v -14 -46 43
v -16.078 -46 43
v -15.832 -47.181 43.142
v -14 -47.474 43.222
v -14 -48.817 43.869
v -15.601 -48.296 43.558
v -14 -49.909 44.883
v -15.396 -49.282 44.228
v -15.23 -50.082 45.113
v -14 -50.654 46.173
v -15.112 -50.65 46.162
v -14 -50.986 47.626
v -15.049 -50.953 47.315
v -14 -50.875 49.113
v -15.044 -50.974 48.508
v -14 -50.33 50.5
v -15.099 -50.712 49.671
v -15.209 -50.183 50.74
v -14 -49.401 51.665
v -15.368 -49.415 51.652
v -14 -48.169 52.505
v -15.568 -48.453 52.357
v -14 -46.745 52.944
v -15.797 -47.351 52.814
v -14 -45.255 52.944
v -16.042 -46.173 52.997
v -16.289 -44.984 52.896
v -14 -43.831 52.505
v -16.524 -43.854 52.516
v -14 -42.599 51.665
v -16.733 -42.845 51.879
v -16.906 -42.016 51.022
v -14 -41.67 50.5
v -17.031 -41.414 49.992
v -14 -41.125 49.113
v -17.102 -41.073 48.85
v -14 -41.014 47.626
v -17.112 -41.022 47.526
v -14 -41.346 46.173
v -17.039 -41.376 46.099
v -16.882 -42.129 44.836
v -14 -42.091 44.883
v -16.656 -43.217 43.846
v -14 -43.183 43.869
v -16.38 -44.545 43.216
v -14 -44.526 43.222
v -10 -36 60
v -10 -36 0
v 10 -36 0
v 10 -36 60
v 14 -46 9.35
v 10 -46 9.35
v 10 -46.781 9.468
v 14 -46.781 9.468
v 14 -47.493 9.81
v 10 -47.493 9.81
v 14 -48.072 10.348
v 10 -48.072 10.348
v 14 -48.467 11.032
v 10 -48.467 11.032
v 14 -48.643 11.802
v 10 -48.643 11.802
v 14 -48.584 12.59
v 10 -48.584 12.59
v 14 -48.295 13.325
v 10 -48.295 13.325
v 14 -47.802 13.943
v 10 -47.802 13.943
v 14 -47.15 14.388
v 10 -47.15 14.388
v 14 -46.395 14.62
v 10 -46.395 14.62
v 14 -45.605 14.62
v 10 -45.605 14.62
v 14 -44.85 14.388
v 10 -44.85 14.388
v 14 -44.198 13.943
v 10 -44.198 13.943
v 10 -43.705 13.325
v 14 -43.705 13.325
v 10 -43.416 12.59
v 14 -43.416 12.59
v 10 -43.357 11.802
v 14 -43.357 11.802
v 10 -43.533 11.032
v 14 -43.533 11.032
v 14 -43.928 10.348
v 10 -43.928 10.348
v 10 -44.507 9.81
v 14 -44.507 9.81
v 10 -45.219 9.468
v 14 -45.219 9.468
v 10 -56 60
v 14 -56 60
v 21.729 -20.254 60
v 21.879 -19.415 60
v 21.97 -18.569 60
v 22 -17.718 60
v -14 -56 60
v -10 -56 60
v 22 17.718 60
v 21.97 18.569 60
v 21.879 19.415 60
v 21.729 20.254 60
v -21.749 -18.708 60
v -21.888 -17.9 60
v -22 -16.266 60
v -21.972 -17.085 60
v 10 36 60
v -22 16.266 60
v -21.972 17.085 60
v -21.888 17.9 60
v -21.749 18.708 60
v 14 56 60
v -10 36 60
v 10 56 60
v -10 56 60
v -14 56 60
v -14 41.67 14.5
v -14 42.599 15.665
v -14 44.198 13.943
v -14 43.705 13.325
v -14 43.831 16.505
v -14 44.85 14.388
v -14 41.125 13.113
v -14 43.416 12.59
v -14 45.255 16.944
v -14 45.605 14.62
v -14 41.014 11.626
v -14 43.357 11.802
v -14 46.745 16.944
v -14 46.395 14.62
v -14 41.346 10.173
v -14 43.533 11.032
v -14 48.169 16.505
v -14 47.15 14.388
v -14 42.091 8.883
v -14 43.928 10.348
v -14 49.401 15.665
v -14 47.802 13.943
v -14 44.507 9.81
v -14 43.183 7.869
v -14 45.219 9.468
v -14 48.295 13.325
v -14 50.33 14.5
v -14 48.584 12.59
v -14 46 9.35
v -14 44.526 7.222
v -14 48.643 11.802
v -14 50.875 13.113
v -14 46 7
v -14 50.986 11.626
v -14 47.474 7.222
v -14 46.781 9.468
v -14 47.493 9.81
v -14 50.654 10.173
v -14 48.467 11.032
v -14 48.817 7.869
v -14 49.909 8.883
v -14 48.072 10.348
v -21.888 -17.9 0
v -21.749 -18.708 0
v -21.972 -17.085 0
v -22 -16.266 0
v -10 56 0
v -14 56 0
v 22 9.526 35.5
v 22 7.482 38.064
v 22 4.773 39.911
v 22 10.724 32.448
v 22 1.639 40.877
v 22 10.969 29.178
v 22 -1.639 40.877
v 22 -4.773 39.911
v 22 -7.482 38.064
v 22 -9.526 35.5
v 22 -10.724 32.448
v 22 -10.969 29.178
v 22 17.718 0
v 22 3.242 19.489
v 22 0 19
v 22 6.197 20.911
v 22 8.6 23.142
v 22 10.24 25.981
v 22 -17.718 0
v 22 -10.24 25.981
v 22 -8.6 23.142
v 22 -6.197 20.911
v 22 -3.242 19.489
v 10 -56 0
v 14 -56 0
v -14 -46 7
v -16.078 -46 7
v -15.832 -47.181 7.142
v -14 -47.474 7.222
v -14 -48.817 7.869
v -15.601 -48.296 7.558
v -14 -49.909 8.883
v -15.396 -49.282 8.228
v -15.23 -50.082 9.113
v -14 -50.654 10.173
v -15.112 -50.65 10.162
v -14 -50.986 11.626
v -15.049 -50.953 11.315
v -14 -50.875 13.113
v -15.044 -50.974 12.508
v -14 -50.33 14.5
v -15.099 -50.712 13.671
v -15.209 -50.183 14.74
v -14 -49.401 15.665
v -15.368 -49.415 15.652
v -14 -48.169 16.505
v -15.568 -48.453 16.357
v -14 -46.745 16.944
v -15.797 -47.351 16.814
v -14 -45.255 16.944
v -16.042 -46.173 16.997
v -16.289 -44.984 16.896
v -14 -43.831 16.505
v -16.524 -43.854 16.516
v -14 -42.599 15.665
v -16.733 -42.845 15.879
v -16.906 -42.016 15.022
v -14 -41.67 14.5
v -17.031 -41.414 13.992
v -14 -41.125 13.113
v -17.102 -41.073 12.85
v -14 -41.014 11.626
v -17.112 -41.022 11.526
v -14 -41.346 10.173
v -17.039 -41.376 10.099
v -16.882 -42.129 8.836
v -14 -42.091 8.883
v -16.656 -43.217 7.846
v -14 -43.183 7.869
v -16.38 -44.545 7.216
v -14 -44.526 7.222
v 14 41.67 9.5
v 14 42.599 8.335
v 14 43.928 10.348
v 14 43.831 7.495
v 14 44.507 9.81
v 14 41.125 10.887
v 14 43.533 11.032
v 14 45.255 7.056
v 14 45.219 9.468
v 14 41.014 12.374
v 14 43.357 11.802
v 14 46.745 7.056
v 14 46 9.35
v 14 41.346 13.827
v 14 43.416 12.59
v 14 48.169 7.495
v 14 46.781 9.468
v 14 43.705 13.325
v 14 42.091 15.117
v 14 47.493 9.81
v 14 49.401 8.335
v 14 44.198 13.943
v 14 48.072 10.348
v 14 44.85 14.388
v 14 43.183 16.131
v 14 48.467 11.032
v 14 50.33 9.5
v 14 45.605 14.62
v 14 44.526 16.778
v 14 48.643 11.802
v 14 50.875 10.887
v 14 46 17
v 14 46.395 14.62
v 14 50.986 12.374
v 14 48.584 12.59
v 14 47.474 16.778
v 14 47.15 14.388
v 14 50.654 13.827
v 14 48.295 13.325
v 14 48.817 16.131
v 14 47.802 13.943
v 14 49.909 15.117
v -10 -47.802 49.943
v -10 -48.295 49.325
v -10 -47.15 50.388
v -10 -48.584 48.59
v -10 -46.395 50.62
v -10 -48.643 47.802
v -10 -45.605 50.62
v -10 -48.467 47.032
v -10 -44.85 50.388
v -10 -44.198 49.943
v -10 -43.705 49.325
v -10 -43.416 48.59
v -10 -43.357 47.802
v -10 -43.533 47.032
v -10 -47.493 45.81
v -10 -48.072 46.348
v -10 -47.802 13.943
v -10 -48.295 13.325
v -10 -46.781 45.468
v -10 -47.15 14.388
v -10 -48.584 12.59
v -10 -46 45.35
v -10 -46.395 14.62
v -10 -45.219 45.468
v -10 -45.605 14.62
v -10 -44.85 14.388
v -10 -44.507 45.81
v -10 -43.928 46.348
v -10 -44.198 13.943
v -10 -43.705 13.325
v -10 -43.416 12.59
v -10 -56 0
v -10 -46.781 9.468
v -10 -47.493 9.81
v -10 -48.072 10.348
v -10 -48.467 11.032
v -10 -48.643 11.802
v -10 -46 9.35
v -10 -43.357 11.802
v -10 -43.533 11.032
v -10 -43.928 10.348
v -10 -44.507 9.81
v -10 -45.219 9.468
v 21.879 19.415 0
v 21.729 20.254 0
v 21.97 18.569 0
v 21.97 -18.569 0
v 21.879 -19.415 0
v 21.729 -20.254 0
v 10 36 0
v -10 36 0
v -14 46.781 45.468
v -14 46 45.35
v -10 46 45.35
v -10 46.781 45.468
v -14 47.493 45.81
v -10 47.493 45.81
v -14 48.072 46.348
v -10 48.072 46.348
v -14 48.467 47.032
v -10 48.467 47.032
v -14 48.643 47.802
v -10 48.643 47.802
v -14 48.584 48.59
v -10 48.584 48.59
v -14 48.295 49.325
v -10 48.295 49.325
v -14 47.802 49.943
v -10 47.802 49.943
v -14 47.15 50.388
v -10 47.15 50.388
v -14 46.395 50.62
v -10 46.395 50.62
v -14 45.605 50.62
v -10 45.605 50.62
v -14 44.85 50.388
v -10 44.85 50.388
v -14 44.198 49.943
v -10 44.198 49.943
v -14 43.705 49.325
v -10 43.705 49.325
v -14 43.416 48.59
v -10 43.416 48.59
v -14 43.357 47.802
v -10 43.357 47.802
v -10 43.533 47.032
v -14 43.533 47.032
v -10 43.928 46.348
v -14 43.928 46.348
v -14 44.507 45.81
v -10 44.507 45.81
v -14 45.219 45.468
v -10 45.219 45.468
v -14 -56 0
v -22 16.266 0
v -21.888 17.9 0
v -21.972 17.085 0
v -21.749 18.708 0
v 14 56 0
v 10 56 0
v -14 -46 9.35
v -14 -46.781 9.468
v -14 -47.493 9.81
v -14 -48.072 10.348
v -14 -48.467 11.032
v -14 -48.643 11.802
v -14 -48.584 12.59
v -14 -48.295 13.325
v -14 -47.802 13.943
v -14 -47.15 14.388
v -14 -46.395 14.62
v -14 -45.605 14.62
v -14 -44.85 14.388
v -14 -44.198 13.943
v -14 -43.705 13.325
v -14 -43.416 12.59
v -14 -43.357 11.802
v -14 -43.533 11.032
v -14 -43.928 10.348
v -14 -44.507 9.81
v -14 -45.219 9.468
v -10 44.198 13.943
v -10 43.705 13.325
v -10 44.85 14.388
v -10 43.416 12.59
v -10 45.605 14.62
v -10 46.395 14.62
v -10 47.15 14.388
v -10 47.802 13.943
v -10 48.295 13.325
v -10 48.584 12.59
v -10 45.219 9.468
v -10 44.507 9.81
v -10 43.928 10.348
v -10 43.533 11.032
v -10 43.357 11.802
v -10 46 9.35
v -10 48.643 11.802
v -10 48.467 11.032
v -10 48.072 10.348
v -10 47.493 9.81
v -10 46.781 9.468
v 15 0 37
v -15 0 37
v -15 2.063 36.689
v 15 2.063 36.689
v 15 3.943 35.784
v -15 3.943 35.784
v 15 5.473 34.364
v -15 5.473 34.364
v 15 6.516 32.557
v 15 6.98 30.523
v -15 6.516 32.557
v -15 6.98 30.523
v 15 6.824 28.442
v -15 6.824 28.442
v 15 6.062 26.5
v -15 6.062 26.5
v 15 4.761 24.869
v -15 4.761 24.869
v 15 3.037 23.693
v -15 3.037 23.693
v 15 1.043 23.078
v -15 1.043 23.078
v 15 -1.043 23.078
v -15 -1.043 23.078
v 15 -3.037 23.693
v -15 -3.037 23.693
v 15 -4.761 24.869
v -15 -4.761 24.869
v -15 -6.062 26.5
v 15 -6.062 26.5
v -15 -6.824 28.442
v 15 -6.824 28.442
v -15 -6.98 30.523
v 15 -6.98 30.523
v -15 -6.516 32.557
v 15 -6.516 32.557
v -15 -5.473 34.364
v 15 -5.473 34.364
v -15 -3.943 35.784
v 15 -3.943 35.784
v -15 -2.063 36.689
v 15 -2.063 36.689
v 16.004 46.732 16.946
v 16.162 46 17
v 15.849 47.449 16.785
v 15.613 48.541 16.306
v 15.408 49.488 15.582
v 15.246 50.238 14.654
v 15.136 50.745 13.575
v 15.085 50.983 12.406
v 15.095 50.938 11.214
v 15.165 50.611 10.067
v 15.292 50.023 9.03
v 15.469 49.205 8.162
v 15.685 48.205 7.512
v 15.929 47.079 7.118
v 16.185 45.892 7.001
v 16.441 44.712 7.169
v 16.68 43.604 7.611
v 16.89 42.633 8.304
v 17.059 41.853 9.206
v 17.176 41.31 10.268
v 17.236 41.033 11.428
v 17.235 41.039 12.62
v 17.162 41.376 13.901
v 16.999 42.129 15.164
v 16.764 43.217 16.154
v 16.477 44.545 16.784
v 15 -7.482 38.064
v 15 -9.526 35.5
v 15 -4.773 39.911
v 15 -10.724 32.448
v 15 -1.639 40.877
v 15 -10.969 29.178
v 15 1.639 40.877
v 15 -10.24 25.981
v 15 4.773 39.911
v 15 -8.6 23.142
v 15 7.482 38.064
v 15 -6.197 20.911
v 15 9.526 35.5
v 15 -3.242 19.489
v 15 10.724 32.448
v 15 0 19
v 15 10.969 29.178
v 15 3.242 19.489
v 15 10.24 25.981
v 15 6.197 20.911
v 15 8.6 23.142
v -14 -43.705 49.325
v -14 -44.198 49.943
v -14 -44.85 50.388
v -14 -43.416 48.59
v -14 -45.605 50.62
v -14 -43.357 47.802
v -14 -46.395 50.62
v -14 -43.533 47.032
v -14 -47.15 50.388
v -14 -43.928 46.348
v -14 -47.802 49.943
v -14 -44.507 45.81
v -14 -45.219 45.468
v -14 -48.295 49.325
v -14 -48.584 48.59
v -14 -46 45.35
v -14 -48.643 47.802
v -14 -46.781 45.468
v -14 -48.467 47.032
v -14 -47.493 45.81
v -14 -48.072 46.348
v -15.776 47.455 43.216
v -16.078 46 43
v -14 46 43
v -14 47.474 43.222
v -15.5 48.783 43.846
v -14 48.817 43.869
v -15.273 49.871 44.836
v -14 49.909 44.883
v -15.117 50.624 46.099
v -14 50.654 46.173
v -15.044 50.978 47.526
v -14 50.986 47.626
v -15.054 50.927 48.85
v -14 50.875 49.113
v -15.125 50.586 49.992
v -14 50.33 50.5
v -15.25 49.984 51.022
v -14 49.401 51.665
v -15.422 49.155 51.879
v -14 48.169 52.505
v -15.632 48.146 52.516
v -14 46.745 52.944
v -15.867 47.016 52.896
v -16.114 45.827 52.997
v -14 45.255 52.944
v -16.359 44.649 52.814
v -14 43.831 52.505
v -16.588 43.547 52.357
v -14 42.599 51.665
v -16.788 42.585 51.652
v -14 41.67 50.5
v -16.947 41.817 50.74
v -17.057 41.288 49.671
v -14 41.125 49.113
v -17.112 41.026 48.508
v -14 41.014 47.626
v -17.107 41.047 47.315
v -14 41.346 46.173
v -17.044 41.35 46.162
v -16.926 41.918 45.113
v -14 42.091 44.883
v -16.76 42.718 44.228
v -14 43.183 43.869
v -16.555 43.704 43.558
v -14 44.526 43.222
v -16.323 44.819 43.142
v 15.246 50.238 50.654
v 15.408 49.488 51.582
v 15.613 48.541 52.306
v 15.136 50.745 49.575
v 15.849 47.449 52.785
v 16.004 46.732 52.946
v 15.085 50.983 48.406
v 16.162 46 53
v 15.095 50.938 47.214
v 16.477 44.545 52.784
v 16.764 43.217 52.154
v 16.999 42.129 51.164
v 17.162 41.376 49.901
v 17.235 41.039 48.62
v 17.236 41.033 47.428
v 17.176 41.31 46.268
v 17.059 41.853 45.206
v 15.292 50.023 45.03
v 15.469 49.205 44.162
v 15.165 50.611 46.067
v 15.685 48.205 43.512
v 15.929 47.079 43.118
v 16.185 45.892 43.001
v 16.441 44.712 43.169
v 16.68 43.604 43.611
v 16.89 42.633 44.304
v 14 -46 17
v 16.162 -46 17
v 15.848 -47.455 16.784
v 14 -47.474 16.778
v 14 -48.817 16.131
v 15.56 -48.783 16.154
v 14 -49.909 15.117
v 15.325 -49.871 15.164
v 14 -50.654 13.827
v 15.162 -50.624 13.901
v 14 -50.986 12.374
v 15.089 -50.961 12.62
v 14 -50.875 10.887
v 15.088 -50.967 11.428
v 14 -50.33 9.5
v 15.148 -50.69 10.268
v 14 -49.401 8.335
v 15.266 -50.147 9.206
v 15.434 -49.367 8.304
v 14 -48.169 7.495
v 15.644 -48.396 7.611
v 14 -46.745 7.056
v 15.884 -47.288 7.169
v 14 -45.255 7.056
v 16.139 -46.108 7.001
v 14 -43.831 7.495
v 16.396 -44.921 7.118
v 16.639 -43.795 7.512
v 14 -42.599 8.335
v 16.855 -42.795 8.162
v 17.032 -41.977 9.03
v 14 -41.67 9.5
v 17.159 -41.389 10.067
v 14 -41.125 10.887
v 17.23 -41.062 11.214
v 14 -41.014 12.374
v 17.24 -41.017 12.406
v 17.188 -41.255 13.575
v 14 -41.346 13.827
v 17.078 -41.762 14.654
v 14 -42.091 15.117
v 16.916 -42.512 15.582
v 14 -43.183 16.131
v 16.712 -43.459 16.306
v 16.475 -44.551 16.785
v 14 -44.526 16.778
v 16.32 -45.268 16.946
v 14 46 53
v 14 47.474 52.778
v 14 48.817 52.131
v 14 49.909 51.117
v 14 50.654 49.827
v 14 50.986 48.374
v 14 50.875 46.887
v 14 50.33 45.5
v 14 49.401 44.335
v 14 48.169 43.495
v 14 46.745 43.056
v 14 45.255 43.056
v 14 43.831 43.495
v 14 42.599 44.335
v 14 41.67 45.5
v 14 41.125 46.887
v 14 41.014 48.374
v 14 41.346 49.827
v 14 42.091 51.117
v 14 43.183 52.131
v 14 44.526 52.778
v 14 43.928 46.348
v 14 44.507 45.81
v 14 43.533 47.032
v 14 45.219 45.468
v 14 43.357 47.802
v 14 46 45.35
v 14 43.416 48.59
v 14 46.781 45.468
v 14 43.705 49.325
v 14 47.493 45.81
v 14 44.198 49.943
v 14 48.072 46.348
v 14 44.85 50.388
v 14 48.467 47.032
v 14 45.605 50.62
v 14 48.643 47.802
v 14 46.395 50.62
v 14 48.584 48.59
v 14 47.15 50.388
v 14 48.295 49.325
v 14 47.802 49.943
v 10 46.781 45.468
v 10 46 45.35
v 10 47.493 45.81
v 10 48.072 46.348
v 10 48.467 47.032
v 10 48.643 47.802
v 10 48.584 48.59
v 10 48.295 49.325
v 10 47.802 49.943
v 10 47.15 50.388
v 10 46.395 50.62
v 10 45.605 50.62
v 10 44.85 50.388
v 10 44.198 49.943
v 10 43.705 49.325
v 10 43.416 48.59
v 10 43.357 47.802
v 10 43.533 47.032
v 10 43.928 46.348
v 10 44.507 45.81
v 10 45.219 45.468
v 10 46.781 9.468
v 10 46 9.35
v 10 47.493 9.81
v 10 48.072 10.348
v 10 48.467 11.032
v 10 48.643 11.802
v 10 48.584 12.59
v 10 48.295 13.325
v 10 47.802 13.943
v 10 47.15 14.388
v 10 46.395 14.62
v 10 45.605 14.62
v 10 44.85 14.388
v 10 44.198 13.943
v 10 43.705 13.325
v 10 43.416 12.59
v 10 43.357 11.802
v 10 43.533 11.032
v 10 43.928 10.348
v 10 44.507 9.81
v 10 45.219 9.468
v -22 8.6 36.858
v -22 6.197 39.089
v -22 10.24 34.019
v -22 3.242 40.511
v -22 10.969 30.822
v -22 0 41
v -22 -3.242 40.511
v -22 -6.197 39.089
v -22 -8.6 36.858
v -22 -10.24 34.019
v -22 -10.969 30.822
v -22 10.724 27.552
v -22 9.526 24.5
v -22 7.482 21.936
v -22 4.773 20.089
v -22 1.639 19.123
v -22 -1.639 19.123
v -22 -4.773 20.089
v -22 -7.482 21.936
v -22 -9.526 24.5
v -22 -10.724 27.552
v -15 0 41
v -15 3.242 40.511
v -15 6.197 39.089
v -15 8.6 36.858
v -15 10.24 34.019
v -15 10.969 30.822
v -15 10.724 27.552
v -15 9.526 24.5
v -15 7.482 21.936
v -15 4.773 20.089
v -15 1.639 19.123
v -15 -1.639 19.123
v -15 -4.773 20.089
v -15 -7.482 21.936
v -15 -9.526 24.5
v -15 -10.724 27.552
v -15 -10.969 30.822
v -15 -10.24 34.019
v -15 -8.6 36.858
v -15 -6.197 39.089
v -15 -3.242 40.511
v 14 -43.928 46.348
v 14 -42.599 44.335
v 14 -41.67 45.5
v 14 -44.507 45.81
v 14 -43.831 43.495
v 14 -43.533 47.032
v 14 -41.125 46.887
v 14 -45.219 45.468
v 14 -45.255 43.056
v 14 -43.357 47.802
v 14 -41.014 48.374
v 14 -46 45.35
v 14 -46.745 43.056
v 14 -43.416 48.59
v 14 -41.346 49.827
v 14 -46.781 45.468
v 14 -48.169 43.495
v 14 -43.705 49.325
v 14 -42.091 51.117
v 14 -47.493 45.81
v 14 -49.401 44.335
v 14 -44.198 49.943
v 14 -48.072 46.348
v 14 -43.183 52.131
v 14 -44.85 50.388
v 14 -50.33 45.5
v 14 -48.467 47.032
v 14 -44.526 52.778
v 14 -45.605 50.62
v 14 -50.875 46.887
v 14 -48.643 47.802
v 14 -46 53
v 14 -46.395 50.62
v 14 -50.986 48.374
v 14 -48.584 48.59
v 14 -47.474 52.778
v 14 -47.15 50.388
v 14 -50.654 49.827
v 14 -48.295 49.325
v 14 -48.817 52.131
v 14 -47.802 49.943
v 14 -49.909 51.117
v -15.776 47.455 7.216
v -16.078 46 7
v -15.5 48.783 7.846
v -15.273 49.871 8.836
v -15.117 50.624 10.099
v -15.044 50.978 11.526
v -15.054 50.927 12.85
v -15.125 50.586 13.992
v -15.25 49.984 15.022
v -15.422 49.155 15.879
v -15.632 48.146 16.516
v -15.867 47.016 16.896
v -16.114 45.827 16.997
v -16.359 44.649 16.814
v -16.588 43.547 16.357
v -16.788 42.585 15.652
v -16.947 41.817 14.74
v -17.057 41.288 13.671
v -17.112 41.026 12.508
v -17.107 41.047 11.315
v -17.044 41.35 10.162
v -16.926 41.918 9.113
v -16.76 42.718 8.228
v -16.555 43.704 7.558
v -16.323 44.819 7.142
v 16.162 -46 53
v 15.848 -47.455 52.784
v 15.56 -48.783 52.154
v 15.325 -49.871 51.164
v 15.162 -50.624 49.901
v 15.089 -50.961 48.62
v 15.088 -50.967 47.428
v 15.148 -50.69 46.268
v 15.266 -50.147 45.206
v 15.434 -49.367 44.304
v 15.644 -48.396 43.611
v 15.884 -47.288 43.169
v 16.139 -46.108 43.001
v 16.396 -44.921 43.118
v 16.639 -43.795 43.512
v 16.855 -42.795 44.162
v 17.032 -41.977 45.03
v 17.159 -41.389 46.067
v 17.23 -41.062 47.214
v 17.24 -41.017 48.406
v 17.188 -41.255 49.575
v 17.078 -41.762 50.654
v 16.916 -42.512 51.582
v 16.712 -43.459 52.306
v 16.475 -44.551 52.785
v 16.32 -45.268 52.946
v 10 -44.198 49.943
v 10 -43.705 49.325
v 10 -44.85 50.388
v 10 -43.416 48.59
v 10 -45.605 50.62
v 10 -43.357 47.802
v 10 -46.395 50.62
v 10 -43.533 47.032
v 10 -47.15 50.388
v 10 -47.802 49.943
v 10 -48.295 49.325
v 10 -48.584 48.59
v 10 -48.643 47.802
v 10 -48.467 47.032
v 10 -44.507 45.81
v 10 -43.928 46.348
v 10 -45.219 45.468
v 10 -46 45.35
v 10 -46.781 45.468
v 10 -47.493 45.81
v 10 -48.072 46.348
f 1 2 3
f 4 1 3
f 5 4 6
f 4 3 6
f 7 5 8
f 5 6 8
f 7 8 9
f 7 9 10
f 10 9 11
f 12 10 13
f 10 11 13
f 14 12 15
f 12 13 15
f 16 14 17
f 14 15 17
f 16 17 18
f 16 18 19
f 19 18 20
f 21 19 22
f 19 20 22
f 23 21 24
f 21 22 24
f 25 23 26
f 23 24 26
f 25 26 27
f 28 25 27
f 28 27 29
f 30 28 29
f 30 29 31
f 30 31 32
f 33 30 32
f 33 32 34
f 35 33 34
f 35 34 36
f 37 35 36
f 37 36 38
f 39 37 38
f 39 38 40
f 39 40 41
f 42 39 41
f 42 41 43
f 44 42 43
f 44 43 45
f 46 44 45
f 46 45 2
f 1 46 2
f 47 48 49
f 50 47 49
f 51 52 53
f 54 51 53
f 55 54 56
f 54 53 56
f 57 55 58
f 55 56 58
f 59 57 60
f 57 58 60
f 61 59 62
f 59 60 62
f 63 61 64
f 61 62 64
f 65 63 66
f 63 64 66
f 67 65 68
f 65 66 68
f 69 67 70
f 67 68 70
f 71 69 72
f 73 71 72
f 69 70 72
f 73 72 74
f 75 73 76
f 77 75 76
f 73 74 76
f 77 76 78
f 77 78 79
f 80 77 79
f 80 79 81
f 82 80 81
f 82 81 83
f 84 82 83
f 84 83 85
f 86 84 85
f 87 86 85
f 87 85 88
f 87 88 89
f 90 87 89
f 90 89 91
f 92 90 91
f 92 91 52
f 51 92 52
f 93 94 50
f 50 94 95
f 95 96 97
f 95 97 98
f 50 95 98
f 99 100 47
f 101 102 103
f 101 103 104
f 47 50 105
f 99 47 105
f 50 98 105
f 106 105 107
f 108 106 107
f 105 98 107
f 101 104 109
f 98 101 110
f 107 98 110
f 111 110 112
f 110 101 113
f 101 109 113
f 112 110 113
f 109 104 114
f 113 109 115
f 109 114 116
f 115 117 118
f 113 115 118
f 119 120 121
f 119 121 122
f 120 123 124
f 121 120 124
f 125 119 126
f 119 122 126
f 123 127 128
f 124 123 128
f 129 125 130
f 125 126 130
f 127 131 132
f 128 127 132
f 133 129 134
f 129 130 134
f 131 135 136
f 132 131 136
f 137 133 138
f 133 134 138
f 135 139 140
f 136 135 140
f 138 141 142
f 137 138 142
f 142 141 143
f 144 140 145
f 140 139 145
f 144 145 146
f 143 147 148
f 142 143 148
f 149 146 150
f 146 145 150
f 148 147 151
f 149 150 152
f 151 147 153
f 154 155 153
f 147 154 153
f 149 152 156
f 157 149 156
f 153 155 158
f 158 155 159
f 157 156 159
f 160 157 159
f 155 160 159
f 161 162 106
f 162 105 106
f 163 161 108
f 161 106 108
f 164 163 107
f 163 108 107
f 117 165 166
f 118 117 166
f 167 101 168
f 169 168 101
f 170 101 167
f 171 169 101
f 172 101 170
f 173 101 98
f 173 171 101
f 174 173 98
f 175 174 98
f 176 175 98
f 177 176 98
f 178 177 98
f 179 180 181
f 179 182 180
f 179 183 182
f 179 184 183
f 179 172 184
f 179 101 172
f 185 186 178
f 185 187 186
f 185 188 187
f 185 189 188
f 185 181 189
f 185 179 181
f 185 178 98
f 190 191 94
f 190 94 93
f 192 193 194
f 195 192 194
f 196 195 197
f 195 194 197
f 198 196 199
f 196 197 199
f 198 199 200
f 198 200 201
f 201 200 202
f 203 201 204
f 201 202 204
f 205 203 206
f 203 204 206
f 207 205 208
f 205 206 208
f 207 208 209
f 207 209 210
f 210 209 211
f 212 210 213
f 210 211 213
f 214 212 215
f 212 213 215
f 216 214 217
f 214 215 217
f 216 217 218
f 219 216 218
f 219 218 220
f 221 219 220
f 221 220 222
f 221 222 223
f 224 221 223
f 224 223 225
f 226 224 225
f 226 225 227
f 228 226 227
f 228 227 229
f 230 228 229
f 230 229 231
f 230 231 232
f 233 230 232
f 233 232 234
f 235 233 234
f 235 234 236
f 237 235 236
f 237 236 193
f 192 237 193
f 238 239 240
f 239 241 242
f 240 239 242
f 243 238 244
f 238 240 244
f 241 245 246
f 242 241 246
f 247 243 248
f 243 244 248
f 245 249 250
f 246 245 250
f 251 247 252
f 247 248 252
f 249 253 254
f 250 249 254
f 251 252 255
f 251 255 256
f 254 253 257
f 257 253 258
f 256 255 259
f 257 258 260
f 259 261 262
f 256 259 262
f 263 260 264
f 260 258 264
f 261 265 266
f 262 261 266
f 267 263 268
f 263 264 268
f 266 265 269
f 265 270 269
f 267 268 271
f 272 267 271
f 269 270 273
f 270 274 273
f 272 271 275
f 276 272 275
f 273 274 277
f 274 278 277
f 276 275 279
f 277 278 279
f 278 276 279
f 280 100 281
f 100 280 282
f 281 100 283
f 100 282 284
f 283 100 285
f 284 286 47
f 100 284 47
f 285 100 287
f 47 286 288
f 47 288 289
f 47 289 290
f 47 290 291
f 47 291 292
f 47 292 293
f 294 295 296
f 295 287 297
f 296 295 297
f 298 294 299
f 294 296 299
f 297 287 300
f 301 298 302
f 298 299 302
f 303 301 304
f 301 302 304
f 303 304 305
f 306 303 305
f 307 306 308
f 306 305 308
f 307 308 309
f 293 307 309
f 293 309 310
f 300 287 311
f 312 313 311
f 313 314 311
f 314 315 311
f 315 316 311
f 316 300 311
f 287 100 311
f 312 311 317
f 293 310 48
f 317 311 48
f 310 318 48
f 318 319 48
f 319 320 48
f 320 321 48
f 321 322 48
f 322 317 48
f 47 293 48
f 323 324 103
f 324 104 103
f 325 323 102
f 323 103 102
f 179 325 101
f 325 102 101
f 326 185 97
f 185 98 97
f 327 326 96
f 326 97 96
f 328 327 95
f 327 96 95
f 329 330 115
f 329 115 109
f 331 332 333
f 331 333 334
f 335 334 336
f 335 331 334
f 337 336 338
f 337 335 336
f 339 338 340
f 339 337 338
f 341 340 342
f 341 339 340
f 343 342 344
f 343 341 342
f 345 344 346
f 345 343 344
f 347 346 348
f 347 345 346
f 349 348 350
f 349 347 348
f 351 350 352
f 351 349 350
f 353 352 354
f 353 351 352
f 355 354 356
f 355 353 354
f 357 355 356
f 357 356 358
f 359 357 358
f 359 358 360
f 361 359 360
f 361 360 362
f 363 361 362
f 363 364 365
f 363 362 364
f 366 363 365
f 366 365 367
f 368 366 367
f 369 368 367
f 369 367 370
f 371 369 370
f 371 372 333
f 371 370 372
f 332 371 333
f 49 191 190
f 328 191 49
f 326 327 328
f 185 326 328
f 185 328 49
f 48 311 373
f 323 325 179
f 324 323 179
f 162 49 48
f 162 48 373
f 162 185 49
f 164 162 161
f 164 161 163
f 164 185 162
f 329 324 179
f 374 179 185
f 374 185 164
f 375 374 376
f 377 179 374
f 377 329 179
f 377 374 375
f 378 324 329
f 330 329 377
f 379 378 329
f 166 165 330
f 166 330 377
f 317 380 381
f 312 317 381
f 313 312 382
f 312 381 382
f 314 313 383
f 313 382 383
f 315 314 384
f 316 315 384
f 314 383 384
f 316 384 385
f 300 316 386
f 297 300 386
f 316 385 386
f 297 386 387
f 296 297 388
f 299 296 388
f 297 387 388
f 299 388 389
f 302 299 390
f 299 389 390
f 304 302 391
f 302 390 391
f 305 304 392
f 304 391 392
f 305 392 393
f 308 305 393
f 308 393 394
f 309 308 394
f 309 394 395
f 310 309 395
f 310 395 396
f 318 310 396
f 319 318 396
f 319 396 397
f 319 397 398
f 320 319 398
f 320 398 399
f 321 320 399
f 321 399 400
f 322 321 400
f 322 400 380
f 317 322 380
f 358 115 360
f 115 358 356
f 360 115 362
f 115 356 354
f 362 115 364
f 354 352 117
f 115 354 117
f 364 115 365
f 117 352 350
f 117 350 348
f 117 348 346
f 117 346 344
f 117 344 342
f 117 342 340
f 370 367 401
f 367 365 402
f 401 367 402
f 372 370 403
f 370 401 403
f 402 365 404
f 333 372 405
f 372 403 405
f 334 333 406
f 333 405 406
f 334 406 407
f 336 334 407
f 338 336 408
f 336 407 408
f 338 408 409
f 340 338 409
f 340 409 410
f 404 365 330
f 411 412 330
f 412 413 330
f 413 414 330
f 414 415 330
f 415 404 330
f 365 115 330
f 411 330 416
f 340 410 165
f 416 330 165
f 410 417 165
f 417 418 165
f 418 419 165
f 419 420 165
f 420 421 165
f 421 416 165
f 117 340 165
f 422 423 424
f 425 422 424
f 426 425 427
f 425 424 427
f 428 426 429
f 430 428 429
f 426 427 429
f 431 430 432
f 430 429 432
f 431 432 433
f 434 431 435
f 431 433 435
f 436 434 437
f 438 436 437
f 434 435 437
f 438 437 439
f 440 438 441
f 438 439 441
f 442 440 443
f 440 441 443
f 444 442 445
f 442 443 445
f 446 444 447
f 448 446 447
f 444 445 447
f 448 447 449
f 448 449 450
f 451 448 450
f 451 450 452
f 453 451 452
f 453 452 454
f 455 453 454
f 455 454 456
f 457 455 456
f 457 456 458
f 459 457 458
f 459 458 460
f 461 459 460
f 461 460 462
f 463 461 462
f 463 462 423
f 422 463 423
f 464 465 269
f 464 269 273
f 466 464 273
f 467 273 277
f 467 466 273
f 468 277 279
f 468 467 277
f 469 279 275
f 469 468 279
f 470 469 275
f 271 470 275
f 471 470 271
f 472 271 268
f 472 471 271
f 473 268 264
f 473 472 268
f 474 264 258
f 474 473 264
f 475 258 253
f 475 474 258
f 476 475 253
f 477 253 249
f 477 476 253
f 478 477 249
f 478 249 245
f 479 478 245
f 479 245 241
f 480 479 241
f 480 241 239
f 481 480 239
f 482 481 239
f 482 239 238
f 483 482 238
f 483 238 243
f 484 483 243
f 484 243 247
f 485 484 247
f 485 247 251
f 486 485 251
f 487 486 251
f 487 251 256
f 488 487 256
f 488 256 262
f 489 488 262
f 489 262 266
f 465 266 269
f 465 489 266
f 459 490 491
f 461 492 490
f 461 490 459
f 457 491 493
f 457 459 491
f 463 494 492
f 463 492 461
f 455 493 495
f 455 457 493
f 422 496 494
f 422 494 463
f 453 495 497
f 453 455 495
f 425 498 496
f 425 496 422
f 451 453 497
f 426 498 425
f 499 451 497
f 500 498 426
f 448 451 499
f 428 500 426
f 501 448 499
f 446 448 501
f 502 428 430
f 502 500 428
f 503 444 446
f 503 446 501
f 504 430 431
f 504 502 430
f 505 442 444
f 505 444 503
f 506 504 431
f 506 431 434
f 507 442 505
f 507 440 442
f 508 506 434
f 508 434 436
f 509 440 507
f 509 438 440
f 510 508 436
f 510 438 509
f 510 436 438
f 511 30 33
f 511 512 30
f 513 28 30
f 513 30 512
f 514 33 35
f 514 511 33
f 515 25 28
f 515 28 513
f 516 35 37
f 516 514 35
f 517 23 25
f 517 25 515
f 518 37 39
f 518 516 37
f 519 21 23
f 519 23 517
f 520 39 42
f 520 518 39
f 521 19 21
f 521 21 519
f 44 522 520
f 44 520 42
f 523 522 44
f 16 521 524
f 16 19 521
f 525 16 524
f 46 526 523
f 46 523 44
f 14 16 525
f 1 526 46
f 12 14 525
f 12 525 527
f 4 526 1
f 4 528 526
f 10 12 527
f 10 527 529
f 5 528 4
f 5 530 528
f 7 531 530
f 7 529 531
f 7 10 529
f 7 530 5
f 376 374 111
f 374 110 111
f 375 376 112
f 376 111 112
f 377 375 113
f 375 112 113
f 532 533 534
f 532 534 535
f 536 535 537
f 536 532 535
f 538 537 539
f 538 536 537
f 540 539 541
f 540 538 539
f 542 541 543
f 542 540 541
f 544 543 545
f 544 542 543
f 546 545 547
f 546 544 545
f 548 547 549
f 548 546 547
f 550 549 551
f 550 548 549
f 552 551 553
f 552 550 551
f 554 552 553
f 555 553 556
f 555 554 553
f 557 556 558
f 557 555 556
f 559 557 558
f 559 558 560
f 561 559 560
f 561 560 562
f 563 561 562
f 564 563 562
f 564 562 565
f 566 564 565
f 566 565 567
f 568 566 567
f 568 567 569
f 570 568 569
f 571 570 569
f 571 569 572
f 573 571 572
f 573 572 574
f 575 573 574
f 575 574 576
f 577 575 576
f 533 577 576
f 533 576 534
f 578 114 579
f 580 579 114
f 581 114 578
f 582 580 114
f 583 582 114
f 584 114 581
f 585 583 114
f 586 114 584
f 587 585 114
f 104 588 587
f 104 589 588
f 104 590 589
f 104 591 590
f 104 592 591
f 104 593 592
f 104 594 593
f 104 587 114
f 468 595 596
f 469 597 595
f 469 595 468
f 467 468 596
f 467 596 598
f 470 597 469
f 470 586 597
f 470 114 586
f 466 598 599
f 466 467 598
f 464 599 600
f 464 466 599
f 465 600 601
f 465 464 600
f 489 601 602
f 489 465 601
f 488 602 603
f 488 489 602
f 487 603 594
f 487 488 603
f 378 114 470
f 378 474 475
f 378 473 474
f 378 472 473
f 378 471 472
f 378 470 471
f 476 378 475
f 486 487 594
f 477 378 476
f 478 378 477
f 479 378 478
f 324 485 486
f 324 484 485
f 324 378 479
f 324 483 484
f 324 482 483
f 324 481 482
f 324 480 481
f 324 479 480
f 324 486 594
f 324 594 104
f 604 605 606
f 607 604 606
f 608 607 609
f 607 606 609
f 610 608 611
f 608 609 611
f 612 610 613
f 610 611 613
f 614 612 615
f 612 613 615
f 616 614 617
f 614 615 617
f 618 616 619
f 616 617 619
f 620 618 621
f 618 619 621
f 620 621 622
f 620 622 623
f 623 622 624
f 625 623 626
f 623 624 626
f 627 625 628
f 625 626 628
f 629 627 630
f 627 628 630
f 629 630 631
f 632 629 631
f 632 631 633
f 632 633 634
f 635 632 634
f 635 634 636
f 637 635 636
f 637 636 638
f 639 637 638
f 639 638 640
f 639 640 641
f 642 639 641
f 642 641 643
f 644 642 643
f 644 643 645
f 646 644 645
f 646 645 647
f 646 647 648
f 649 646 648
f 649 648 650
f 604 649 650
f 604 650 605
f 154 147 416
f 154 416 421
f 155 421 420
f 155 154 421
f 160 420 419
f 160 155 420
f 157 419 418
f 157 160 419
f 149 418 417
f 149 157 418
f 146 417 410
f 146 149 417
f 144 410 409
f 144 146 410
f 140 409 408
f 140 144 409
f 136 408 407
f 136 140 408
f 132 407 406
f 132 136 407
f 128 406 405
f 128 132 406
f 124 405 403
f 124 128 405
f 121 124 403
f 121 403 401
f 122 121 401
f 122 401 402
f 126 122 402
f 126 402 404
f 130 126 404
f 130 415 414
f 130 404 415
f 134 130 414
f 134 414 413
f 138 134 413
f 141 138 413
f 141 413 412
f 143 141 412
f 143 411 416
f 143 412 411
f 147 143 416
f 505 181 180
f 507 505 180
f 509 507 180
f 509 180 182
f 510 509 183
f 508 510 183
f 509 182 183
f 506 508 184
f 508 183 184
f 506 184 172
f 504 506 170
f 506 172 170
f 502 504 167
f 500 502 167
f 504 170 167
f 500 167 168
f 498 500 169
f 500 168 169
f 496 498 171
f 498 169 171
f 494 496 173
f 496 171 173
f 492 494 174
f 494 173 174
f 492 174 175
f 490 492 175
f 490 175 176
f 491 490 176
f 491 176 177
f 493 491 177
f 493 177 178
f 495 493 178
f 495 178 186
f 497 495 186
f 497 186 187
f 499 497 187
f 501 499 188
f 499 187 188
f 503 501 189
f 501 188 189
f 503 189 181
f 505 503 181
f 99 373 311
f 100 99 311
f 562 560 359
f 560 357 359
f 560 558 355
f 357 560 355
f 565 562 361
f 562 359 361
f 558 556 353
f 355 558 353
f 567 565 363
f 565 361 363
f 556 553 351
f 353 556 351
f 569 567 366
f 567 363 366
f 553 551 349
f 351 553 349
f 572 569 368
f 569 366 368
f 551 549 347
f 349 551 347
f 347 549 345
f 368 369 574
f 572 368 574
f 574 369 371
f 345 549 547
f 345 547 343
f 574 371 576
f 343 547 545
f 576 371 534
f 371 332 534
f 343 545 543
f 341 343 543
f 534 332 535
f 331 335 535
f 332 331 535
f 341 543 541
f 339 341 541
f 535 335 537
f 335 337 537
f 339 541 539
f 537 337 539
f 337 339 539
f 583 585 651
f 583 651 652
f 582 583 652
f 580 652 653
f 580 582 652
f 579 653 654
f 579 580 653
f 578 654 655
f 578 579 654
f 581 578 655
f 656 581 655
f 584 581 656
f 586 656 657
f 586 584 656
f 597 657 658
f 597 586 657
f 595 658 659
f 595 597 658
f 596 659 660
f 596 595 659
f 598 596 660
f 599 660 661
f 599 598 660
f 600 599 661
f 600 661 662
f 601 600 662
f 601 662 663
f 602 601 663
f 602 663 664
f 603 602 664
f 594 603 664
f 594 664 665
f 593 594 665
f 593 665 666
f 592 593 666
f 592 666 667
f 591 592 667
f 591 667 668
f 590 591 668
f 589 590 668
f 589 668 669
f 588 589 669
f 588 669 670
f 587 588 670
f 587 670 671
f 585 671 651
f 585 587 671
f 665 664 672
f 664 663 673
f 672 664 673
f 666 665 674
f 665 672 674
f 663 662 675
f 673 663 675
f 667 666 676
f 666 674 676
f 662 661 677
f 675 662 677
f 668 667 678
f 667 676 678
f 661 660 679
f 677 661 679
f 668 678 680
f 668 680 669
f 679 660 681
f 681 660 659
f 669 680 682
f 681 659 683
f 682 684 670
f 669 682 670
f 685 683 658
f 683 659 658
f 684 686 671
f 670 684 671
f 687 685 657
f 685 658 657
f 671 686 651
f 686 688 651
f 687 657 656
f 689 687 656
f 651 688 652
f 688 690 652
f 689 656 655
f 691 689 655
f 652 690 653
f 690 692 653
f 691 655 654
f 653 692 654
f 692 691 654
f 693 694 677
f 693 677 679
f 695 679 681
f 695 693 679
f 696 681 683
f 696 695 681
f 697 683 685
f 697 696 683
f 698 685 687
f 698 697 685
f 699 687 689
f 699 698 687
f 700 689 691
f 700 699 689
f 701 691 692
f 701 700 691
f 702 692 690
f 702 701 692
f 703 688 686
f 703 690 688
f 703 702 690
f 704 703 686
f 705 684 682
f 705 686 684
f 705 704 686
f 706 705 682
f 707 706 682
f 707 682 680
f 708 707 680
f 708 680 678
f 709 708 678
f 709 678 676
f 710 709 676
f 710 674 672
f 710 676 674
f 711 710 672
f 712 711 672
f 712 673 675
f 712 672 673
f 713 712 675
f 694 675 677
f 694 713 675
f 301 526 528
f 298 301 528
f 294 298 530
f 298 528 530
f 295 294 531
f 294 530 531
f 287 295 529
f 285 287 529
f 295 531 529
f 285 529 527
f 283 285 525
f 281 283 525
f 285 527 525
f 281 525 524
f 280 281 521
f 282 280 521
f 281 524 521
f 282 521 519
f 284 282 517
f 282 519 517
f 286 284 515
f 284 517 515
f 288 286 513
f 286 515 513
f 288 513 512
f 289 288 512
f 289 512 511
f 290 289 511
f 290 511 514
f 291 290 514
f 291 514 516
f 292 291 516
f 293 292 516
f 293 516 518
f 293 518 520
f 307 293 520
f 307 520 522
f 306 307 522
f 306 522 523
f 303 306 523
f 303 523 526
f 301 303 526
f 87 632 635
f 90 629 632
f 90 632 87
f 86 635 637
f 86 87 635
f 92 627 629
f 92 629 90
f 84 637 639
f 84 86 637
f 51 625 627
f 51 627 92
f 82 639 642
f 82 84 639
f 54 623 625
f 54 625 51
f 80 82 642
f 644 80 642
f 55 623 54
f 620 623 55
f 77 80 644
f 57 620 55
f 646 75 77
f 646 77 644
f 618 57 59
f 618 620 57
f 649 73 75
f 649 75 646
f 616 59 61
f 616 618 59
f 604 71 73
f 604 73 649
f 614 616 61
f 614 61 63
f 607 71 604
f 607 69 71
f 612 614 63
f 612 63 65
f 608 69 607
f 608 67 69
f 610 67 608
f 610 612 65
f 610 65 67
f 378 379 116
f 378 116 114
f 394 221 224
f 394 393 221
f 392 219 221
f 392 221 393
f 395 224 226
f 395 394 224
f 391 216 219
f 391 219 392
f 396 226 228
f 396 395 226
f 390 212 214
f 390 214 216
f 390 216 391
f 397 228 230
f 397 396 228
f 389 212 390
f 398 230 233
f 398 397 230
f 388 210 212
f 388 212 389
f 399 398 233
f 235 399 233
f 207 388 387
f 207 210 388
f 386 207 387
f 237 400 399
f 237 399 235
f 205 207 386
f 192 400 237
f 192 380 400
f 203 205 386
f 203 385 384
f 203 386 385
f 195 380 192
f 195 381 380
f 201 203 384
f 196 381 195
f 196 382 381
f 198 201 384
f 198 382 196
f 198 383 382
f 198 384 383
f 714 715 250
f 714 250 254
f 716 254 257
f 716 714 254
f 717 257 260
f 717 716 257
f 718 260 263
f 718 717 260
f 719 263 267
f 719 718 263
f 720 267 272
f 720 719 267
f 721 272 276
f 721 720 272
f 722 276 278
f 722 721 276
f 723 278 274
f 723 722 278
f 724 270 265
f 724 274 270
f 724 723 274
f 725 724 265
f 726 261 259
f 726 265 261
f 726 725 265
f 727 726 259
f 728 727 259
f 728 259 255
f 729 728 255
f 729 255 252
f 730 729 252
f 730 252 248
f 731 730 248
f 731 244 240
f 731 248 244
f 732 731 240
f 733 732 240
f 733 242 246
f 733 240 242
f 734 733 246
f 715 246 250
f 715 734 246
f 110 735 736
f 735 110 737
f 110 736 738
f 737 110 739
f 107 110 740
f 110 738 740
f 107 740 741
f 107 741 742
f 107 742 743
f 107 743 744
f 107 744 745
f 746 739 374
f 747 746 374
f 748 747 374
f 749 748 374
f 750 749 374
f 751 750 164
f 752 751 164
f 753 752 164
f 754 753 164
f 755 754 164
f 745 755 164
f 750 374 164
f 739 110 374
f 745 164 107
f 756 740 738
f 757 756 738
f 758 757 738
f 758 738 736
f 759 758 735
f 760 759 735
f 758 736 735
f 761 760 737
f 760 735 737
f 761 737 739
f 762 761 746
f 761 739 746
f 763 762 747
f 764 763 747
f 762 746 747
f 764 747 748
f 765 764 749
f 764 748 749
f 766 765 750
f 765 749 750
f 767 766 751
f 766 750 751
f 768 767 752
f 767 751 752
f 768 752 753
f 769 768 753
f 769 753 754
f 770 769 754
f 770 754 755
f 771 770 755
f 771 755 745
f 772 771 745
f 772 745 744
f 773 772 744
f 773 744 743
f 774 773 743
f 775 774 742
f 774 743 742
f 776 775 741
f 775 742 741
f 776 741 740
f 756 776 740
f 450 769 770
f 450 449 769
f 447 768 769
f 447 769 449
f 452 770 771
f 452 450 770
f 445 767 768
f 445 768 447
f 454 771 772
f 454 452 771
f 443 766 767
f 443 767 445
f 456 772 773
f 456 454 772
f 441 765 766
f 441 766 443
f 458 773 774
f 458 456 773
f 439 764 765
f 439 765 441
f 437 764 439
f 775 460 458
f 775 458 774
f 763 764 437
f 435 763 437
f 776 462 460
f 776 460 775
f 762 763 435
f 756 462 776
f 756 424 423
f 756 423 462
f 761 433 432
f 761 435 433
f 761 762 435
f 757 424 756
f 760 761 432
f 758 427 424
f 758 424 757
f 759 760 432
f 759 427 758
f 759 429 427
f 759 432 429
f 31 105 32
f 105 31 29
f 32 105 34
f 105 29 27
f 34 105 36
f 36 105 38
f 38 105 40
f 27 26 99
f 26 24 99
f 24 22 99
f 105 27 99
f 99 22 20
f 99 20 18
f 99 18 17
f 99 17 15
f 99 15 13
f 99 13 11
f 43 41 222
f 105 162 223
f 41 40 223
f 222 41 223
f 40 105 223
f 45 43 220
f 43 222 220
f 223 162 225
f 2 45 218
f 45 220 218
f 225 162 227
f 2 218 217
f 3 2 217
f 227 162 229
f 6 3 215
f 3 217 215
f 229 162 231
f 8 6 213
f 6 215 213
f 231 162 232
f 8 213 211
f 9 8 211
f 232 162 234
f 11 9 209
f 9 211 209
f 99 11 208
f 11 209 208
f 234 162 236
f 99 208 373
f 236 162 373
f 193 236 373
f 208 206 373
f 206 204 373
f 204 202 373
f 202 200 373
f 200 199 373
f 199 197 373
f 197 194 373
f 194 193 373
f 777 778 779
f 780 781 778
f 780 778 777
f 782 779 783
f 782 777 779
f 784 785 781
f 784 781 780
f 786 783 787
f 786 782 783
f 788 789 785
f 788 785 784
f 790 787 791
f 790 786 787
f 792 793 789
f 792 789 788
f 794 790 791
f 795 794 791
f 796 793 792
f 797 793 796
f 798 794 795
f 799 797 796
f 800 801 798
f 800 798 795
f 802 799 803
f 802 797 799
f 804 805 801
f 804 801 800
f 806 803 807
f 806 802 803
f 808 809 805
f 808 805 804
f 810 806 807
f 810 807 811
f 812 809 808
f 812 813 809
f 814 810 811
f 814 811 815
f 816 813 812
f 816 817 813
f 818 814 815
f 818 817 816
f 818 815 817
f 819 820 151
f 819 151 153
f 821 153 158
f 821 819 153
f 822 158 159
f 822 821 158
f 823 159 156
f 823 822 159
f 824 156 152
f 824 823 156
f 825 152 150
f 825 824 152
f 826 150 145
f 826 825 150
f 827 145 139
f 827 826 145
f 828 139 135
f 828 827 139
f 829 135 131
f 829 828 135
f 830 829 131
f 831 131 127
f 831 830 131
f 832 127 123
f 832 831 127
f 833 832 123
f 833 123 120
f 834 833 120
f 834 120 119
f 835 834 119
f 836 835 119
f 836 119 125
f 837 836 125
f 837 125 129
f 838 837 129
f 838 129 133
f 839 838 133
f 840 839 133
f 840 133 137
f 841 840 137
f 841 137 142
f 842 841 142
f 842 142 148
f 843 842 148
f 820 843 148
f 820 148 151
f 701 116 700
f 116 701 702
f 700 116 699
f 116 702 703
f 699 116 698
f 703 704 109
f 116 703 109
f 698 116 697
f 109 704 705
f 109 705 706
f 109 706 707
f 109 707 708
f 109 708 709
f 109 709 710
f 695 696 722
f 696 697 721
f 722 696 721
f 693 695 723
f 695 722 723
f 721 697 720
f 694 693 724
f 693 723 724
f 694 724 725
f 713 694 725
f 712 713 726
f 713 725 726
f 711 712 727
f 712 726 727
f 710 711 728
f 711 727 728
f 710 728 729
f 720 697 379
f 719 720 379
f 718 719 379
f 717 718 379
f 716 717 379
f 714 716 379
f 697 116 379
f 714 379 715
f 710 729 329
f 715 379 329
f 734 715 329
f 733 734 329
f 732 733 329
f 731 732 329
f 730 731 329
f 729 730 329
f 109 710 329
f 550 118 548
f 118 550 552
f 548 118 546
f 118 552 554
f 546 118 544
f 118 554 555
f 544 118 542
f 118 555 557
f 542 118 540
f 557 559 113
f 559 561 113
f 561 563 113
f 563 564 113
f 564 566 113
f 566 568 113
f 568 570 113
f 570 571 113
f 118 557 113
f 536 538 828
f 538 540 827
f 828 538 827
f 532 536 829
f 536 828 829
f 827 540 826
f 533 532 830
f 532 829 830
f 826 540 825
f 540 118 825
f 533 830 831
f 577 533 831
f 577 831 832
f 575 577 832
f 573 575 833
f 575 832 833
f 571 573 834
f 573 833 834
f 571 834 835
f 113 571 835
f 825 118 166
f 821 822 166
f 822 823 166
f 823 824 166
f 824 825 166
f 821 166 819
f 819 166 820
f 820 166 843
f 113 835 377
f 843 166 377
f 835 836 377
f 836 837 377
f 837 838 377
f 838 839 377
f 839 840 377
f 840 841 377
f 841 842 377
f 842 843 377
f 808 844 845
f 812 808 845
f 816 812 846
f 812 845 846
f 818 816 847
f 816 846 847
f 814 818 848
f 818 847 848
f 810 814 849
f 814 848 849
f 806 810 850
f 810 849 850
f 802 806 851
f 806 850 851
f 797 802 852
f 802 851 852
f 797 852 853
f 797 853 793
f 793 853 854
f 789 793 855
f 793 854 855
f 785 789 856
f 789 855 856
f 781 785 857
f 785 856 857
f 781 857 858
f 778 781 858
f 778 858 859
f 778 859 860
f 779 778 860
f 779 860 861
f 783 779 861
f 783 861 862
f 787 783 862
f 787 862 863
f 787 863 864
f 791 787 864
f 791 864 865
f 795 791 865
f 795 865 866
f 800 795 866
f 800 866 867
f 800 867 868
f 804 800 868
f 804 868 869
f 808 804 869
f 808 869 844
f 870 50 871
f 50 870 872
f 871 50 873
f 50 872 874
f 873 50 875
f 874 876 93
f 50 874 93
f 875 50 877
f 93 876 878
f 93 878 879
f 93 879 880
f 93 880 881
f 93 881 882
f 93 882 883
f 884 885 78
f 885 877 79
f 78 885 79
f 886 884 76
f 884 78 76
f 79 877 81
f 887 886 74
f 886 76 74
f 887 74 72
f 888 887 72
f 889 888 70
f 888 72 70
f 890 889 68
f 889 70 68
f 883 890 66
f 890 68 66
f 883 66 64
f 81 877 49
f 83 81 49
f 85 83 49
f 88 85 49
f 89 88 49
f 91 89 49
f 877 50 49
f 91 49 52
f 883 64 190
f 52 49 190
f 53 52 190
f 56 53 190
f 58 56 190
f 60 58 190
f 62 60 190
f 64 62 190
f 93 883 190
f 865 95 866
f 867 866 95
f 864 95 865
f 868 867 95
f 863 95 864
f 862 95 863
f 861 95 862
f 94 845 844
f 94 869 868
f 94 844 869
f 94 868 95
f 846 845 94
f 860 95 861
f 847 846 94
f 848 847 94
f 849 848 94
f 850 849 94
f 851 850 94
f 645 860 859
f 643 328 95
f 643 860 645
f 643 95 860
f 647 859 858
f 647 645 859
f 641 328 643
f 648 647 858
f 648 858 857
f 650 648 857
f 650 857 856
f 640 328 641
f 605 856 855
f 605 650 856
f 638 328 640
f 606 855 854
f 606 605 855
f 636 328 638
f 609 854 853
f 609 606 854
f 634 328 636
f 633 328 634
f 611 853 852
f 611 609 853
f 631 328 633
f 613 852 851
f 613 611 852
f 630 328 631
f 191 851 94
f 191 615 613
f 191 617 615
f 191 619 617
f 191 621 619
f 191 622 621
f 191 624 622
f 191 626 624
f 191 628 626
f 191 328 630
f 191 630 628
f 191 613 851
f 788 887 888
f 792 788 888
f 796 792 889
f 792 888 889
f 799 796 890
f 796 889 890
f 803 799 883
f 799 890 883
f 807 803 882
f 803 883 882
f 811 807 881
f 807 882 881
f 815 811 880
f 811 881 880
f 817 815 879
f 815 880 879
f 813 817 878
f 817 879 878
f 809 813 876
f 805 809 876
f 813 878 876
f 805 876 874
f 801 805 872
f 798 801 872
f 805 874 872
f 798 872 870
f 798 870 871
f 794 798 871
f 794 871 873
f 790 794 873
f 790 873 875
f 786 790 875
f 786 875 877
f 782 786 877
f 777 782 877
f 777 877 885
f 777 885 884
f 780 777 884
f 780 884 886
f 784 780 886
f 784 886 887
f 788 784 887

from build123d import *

# Parameters (mm, degrees)
SKETCH1_W           = 20
SKETCH1_H           = 72
BOSS_EXTRUDE1_DEPTH = 60
SKETCH2_R           = 7
CUT_EXTRUDE1_DEPTH  = 45
SKETCH3_R           = 11
CUT_EXTRUDE2_DEPTH  = 7
SKETCH4_R           = 11
CUT_EXTRUDE3_DEPTH  = 7
SKETCH5_R           = 2.65
CUT_EXTRUDE4_DEPTH  = 41
SKETCH6_R           = 5
CUT_EXTRUDE5_DEPTH  = 4
FILLET1_R           = 12
SKETCH7_R           = 5
CUT_EXTRUDE6_DEPTH  = 4


with BuildPart() as part:
    # Sketch1 → Boss-Extrude1 (new body)
    with BuildSketch(Plane.XY):
        Polygon((10, 36), (10, 56), (14, 56), (22, 19), (22, -19), (14, -56), (10, -56), (10, -36), align=None)
        Rectangle(SKETCH1_W, SKETCH1_H)
        Polygon((-14, -56), (-10, -56), (-10, -36), (-10, 36), (-10, 56), (-14, 56), (-22, 17.5), (-22, -17.5), align=None)
        Polygon((14, 56), (22, 19), (22, -19), (14, -56), align=None)
    extrude(amount=BOSS_EXTRUDE1_DEPTH)

    # Sketch2 → Cut-Extrude1 (cut, through all)
    with BuildSketch(Plane.ZY.offset(22)):
        with Locations((30, 0)):
            Circle(SKETCH2_R)
    extrude(amount=-CUT_EXTRUDE1_DEPTH, mode=Mode.SUBTRACT)

    # Sketch3 → Cut-Extrude2 (cut)
    with BuildSketch(Plane.ZY.offset(22)):
        with Locations((30, 0)):
            Circle(SKETCH3_R)
    extrude(amount=-CUT_EXTRUDE2_DEPTH, mode=Mode.SUBTRACT)

    # Sketch4 → Cut-Extrude3 (cut)
    with BuildSketch(Plane(origin=(22, 0, 0), x_dir=(0, 0, -1), z_dir=(1, 0, 0))):
        with Locations((-30, 0)):
            Circle(SKETCH4_R)
    extrude(amount=-CUT_EXTRUDE3_DEPTH, mode=Mode.SUBTRACT)

    # Sketch5 → Cut-Extrude4 (cut, through all)
    with BuildSketch(Plane(origin=(-18, 0, 0), x_dir=(0, 0, -1), z_dir=(1, 0, 0))):
        with Locations((-12, 46)):
            Circle(SKETCH5_R)
        with Locations((-48, 46)):
            Circle(SKETCH5_R)
    cut_extrude4 = extrude(amount=CUT_EXTRUDE4_DEPTH, mode=Mode.SUBTRACT)

    # Sketch6 → Cut-Extrude5 (cut)
    with BuildSketch(Plane(origin=(-18, 0, 0), x_dir=(0, 0, -1), z_dir=(1, 0, 0))):
        with Locations((-12, 46)):
            Circle(SKETCH6_R)
        with Locations((-48, 46)):
            Circle(SKETCH6_R)
    cut_extrude5 = extrude(amount=CUT_EXTRUDE5_DEPTH, mode=Mode.SUBTRACT)

    # Mirror3: Cut-Extrude4, Cut-Extrude5 across plane
    add(cut_extrude4.mirror(Plane.ZX), mode=Mode.SUBTRACT)
    add(cut_extrude5.mirror(Plane.ZX), mode=Mode.SUBTRACT)

    # Fillet1
    fillet1_edges = [part.edges().sort_by_distance(p)[0] for p in [
        (-22, -17.5, 30),
        (-22, 17.5, 30),
        (22, 19, 30),
        (22, -19, 30),
    ]]
    fillet(fillet1_edges, radius=FILLET1_R)

    # Sketch7 → Cut-Extrude6 (cut)
    with BuildSketch(Plane.ZY.offset(-18)):
        with Locations((12, 46)):
            Circle(SKETCH7_R)
        with Locations((48, 46)):
            Circle(SKETCH7_R)
    cut_extrude6 = extrude(amount=CUT_EXTRUDE6_DEPTH, mode=Mode.SUBTRACT)

    # Mirror5: Cut-Extrude6 across plane
    add(cut_extrude6.mirror(Plane.ZX), mode=Mode.SUBTRACT)


solid = part.part
